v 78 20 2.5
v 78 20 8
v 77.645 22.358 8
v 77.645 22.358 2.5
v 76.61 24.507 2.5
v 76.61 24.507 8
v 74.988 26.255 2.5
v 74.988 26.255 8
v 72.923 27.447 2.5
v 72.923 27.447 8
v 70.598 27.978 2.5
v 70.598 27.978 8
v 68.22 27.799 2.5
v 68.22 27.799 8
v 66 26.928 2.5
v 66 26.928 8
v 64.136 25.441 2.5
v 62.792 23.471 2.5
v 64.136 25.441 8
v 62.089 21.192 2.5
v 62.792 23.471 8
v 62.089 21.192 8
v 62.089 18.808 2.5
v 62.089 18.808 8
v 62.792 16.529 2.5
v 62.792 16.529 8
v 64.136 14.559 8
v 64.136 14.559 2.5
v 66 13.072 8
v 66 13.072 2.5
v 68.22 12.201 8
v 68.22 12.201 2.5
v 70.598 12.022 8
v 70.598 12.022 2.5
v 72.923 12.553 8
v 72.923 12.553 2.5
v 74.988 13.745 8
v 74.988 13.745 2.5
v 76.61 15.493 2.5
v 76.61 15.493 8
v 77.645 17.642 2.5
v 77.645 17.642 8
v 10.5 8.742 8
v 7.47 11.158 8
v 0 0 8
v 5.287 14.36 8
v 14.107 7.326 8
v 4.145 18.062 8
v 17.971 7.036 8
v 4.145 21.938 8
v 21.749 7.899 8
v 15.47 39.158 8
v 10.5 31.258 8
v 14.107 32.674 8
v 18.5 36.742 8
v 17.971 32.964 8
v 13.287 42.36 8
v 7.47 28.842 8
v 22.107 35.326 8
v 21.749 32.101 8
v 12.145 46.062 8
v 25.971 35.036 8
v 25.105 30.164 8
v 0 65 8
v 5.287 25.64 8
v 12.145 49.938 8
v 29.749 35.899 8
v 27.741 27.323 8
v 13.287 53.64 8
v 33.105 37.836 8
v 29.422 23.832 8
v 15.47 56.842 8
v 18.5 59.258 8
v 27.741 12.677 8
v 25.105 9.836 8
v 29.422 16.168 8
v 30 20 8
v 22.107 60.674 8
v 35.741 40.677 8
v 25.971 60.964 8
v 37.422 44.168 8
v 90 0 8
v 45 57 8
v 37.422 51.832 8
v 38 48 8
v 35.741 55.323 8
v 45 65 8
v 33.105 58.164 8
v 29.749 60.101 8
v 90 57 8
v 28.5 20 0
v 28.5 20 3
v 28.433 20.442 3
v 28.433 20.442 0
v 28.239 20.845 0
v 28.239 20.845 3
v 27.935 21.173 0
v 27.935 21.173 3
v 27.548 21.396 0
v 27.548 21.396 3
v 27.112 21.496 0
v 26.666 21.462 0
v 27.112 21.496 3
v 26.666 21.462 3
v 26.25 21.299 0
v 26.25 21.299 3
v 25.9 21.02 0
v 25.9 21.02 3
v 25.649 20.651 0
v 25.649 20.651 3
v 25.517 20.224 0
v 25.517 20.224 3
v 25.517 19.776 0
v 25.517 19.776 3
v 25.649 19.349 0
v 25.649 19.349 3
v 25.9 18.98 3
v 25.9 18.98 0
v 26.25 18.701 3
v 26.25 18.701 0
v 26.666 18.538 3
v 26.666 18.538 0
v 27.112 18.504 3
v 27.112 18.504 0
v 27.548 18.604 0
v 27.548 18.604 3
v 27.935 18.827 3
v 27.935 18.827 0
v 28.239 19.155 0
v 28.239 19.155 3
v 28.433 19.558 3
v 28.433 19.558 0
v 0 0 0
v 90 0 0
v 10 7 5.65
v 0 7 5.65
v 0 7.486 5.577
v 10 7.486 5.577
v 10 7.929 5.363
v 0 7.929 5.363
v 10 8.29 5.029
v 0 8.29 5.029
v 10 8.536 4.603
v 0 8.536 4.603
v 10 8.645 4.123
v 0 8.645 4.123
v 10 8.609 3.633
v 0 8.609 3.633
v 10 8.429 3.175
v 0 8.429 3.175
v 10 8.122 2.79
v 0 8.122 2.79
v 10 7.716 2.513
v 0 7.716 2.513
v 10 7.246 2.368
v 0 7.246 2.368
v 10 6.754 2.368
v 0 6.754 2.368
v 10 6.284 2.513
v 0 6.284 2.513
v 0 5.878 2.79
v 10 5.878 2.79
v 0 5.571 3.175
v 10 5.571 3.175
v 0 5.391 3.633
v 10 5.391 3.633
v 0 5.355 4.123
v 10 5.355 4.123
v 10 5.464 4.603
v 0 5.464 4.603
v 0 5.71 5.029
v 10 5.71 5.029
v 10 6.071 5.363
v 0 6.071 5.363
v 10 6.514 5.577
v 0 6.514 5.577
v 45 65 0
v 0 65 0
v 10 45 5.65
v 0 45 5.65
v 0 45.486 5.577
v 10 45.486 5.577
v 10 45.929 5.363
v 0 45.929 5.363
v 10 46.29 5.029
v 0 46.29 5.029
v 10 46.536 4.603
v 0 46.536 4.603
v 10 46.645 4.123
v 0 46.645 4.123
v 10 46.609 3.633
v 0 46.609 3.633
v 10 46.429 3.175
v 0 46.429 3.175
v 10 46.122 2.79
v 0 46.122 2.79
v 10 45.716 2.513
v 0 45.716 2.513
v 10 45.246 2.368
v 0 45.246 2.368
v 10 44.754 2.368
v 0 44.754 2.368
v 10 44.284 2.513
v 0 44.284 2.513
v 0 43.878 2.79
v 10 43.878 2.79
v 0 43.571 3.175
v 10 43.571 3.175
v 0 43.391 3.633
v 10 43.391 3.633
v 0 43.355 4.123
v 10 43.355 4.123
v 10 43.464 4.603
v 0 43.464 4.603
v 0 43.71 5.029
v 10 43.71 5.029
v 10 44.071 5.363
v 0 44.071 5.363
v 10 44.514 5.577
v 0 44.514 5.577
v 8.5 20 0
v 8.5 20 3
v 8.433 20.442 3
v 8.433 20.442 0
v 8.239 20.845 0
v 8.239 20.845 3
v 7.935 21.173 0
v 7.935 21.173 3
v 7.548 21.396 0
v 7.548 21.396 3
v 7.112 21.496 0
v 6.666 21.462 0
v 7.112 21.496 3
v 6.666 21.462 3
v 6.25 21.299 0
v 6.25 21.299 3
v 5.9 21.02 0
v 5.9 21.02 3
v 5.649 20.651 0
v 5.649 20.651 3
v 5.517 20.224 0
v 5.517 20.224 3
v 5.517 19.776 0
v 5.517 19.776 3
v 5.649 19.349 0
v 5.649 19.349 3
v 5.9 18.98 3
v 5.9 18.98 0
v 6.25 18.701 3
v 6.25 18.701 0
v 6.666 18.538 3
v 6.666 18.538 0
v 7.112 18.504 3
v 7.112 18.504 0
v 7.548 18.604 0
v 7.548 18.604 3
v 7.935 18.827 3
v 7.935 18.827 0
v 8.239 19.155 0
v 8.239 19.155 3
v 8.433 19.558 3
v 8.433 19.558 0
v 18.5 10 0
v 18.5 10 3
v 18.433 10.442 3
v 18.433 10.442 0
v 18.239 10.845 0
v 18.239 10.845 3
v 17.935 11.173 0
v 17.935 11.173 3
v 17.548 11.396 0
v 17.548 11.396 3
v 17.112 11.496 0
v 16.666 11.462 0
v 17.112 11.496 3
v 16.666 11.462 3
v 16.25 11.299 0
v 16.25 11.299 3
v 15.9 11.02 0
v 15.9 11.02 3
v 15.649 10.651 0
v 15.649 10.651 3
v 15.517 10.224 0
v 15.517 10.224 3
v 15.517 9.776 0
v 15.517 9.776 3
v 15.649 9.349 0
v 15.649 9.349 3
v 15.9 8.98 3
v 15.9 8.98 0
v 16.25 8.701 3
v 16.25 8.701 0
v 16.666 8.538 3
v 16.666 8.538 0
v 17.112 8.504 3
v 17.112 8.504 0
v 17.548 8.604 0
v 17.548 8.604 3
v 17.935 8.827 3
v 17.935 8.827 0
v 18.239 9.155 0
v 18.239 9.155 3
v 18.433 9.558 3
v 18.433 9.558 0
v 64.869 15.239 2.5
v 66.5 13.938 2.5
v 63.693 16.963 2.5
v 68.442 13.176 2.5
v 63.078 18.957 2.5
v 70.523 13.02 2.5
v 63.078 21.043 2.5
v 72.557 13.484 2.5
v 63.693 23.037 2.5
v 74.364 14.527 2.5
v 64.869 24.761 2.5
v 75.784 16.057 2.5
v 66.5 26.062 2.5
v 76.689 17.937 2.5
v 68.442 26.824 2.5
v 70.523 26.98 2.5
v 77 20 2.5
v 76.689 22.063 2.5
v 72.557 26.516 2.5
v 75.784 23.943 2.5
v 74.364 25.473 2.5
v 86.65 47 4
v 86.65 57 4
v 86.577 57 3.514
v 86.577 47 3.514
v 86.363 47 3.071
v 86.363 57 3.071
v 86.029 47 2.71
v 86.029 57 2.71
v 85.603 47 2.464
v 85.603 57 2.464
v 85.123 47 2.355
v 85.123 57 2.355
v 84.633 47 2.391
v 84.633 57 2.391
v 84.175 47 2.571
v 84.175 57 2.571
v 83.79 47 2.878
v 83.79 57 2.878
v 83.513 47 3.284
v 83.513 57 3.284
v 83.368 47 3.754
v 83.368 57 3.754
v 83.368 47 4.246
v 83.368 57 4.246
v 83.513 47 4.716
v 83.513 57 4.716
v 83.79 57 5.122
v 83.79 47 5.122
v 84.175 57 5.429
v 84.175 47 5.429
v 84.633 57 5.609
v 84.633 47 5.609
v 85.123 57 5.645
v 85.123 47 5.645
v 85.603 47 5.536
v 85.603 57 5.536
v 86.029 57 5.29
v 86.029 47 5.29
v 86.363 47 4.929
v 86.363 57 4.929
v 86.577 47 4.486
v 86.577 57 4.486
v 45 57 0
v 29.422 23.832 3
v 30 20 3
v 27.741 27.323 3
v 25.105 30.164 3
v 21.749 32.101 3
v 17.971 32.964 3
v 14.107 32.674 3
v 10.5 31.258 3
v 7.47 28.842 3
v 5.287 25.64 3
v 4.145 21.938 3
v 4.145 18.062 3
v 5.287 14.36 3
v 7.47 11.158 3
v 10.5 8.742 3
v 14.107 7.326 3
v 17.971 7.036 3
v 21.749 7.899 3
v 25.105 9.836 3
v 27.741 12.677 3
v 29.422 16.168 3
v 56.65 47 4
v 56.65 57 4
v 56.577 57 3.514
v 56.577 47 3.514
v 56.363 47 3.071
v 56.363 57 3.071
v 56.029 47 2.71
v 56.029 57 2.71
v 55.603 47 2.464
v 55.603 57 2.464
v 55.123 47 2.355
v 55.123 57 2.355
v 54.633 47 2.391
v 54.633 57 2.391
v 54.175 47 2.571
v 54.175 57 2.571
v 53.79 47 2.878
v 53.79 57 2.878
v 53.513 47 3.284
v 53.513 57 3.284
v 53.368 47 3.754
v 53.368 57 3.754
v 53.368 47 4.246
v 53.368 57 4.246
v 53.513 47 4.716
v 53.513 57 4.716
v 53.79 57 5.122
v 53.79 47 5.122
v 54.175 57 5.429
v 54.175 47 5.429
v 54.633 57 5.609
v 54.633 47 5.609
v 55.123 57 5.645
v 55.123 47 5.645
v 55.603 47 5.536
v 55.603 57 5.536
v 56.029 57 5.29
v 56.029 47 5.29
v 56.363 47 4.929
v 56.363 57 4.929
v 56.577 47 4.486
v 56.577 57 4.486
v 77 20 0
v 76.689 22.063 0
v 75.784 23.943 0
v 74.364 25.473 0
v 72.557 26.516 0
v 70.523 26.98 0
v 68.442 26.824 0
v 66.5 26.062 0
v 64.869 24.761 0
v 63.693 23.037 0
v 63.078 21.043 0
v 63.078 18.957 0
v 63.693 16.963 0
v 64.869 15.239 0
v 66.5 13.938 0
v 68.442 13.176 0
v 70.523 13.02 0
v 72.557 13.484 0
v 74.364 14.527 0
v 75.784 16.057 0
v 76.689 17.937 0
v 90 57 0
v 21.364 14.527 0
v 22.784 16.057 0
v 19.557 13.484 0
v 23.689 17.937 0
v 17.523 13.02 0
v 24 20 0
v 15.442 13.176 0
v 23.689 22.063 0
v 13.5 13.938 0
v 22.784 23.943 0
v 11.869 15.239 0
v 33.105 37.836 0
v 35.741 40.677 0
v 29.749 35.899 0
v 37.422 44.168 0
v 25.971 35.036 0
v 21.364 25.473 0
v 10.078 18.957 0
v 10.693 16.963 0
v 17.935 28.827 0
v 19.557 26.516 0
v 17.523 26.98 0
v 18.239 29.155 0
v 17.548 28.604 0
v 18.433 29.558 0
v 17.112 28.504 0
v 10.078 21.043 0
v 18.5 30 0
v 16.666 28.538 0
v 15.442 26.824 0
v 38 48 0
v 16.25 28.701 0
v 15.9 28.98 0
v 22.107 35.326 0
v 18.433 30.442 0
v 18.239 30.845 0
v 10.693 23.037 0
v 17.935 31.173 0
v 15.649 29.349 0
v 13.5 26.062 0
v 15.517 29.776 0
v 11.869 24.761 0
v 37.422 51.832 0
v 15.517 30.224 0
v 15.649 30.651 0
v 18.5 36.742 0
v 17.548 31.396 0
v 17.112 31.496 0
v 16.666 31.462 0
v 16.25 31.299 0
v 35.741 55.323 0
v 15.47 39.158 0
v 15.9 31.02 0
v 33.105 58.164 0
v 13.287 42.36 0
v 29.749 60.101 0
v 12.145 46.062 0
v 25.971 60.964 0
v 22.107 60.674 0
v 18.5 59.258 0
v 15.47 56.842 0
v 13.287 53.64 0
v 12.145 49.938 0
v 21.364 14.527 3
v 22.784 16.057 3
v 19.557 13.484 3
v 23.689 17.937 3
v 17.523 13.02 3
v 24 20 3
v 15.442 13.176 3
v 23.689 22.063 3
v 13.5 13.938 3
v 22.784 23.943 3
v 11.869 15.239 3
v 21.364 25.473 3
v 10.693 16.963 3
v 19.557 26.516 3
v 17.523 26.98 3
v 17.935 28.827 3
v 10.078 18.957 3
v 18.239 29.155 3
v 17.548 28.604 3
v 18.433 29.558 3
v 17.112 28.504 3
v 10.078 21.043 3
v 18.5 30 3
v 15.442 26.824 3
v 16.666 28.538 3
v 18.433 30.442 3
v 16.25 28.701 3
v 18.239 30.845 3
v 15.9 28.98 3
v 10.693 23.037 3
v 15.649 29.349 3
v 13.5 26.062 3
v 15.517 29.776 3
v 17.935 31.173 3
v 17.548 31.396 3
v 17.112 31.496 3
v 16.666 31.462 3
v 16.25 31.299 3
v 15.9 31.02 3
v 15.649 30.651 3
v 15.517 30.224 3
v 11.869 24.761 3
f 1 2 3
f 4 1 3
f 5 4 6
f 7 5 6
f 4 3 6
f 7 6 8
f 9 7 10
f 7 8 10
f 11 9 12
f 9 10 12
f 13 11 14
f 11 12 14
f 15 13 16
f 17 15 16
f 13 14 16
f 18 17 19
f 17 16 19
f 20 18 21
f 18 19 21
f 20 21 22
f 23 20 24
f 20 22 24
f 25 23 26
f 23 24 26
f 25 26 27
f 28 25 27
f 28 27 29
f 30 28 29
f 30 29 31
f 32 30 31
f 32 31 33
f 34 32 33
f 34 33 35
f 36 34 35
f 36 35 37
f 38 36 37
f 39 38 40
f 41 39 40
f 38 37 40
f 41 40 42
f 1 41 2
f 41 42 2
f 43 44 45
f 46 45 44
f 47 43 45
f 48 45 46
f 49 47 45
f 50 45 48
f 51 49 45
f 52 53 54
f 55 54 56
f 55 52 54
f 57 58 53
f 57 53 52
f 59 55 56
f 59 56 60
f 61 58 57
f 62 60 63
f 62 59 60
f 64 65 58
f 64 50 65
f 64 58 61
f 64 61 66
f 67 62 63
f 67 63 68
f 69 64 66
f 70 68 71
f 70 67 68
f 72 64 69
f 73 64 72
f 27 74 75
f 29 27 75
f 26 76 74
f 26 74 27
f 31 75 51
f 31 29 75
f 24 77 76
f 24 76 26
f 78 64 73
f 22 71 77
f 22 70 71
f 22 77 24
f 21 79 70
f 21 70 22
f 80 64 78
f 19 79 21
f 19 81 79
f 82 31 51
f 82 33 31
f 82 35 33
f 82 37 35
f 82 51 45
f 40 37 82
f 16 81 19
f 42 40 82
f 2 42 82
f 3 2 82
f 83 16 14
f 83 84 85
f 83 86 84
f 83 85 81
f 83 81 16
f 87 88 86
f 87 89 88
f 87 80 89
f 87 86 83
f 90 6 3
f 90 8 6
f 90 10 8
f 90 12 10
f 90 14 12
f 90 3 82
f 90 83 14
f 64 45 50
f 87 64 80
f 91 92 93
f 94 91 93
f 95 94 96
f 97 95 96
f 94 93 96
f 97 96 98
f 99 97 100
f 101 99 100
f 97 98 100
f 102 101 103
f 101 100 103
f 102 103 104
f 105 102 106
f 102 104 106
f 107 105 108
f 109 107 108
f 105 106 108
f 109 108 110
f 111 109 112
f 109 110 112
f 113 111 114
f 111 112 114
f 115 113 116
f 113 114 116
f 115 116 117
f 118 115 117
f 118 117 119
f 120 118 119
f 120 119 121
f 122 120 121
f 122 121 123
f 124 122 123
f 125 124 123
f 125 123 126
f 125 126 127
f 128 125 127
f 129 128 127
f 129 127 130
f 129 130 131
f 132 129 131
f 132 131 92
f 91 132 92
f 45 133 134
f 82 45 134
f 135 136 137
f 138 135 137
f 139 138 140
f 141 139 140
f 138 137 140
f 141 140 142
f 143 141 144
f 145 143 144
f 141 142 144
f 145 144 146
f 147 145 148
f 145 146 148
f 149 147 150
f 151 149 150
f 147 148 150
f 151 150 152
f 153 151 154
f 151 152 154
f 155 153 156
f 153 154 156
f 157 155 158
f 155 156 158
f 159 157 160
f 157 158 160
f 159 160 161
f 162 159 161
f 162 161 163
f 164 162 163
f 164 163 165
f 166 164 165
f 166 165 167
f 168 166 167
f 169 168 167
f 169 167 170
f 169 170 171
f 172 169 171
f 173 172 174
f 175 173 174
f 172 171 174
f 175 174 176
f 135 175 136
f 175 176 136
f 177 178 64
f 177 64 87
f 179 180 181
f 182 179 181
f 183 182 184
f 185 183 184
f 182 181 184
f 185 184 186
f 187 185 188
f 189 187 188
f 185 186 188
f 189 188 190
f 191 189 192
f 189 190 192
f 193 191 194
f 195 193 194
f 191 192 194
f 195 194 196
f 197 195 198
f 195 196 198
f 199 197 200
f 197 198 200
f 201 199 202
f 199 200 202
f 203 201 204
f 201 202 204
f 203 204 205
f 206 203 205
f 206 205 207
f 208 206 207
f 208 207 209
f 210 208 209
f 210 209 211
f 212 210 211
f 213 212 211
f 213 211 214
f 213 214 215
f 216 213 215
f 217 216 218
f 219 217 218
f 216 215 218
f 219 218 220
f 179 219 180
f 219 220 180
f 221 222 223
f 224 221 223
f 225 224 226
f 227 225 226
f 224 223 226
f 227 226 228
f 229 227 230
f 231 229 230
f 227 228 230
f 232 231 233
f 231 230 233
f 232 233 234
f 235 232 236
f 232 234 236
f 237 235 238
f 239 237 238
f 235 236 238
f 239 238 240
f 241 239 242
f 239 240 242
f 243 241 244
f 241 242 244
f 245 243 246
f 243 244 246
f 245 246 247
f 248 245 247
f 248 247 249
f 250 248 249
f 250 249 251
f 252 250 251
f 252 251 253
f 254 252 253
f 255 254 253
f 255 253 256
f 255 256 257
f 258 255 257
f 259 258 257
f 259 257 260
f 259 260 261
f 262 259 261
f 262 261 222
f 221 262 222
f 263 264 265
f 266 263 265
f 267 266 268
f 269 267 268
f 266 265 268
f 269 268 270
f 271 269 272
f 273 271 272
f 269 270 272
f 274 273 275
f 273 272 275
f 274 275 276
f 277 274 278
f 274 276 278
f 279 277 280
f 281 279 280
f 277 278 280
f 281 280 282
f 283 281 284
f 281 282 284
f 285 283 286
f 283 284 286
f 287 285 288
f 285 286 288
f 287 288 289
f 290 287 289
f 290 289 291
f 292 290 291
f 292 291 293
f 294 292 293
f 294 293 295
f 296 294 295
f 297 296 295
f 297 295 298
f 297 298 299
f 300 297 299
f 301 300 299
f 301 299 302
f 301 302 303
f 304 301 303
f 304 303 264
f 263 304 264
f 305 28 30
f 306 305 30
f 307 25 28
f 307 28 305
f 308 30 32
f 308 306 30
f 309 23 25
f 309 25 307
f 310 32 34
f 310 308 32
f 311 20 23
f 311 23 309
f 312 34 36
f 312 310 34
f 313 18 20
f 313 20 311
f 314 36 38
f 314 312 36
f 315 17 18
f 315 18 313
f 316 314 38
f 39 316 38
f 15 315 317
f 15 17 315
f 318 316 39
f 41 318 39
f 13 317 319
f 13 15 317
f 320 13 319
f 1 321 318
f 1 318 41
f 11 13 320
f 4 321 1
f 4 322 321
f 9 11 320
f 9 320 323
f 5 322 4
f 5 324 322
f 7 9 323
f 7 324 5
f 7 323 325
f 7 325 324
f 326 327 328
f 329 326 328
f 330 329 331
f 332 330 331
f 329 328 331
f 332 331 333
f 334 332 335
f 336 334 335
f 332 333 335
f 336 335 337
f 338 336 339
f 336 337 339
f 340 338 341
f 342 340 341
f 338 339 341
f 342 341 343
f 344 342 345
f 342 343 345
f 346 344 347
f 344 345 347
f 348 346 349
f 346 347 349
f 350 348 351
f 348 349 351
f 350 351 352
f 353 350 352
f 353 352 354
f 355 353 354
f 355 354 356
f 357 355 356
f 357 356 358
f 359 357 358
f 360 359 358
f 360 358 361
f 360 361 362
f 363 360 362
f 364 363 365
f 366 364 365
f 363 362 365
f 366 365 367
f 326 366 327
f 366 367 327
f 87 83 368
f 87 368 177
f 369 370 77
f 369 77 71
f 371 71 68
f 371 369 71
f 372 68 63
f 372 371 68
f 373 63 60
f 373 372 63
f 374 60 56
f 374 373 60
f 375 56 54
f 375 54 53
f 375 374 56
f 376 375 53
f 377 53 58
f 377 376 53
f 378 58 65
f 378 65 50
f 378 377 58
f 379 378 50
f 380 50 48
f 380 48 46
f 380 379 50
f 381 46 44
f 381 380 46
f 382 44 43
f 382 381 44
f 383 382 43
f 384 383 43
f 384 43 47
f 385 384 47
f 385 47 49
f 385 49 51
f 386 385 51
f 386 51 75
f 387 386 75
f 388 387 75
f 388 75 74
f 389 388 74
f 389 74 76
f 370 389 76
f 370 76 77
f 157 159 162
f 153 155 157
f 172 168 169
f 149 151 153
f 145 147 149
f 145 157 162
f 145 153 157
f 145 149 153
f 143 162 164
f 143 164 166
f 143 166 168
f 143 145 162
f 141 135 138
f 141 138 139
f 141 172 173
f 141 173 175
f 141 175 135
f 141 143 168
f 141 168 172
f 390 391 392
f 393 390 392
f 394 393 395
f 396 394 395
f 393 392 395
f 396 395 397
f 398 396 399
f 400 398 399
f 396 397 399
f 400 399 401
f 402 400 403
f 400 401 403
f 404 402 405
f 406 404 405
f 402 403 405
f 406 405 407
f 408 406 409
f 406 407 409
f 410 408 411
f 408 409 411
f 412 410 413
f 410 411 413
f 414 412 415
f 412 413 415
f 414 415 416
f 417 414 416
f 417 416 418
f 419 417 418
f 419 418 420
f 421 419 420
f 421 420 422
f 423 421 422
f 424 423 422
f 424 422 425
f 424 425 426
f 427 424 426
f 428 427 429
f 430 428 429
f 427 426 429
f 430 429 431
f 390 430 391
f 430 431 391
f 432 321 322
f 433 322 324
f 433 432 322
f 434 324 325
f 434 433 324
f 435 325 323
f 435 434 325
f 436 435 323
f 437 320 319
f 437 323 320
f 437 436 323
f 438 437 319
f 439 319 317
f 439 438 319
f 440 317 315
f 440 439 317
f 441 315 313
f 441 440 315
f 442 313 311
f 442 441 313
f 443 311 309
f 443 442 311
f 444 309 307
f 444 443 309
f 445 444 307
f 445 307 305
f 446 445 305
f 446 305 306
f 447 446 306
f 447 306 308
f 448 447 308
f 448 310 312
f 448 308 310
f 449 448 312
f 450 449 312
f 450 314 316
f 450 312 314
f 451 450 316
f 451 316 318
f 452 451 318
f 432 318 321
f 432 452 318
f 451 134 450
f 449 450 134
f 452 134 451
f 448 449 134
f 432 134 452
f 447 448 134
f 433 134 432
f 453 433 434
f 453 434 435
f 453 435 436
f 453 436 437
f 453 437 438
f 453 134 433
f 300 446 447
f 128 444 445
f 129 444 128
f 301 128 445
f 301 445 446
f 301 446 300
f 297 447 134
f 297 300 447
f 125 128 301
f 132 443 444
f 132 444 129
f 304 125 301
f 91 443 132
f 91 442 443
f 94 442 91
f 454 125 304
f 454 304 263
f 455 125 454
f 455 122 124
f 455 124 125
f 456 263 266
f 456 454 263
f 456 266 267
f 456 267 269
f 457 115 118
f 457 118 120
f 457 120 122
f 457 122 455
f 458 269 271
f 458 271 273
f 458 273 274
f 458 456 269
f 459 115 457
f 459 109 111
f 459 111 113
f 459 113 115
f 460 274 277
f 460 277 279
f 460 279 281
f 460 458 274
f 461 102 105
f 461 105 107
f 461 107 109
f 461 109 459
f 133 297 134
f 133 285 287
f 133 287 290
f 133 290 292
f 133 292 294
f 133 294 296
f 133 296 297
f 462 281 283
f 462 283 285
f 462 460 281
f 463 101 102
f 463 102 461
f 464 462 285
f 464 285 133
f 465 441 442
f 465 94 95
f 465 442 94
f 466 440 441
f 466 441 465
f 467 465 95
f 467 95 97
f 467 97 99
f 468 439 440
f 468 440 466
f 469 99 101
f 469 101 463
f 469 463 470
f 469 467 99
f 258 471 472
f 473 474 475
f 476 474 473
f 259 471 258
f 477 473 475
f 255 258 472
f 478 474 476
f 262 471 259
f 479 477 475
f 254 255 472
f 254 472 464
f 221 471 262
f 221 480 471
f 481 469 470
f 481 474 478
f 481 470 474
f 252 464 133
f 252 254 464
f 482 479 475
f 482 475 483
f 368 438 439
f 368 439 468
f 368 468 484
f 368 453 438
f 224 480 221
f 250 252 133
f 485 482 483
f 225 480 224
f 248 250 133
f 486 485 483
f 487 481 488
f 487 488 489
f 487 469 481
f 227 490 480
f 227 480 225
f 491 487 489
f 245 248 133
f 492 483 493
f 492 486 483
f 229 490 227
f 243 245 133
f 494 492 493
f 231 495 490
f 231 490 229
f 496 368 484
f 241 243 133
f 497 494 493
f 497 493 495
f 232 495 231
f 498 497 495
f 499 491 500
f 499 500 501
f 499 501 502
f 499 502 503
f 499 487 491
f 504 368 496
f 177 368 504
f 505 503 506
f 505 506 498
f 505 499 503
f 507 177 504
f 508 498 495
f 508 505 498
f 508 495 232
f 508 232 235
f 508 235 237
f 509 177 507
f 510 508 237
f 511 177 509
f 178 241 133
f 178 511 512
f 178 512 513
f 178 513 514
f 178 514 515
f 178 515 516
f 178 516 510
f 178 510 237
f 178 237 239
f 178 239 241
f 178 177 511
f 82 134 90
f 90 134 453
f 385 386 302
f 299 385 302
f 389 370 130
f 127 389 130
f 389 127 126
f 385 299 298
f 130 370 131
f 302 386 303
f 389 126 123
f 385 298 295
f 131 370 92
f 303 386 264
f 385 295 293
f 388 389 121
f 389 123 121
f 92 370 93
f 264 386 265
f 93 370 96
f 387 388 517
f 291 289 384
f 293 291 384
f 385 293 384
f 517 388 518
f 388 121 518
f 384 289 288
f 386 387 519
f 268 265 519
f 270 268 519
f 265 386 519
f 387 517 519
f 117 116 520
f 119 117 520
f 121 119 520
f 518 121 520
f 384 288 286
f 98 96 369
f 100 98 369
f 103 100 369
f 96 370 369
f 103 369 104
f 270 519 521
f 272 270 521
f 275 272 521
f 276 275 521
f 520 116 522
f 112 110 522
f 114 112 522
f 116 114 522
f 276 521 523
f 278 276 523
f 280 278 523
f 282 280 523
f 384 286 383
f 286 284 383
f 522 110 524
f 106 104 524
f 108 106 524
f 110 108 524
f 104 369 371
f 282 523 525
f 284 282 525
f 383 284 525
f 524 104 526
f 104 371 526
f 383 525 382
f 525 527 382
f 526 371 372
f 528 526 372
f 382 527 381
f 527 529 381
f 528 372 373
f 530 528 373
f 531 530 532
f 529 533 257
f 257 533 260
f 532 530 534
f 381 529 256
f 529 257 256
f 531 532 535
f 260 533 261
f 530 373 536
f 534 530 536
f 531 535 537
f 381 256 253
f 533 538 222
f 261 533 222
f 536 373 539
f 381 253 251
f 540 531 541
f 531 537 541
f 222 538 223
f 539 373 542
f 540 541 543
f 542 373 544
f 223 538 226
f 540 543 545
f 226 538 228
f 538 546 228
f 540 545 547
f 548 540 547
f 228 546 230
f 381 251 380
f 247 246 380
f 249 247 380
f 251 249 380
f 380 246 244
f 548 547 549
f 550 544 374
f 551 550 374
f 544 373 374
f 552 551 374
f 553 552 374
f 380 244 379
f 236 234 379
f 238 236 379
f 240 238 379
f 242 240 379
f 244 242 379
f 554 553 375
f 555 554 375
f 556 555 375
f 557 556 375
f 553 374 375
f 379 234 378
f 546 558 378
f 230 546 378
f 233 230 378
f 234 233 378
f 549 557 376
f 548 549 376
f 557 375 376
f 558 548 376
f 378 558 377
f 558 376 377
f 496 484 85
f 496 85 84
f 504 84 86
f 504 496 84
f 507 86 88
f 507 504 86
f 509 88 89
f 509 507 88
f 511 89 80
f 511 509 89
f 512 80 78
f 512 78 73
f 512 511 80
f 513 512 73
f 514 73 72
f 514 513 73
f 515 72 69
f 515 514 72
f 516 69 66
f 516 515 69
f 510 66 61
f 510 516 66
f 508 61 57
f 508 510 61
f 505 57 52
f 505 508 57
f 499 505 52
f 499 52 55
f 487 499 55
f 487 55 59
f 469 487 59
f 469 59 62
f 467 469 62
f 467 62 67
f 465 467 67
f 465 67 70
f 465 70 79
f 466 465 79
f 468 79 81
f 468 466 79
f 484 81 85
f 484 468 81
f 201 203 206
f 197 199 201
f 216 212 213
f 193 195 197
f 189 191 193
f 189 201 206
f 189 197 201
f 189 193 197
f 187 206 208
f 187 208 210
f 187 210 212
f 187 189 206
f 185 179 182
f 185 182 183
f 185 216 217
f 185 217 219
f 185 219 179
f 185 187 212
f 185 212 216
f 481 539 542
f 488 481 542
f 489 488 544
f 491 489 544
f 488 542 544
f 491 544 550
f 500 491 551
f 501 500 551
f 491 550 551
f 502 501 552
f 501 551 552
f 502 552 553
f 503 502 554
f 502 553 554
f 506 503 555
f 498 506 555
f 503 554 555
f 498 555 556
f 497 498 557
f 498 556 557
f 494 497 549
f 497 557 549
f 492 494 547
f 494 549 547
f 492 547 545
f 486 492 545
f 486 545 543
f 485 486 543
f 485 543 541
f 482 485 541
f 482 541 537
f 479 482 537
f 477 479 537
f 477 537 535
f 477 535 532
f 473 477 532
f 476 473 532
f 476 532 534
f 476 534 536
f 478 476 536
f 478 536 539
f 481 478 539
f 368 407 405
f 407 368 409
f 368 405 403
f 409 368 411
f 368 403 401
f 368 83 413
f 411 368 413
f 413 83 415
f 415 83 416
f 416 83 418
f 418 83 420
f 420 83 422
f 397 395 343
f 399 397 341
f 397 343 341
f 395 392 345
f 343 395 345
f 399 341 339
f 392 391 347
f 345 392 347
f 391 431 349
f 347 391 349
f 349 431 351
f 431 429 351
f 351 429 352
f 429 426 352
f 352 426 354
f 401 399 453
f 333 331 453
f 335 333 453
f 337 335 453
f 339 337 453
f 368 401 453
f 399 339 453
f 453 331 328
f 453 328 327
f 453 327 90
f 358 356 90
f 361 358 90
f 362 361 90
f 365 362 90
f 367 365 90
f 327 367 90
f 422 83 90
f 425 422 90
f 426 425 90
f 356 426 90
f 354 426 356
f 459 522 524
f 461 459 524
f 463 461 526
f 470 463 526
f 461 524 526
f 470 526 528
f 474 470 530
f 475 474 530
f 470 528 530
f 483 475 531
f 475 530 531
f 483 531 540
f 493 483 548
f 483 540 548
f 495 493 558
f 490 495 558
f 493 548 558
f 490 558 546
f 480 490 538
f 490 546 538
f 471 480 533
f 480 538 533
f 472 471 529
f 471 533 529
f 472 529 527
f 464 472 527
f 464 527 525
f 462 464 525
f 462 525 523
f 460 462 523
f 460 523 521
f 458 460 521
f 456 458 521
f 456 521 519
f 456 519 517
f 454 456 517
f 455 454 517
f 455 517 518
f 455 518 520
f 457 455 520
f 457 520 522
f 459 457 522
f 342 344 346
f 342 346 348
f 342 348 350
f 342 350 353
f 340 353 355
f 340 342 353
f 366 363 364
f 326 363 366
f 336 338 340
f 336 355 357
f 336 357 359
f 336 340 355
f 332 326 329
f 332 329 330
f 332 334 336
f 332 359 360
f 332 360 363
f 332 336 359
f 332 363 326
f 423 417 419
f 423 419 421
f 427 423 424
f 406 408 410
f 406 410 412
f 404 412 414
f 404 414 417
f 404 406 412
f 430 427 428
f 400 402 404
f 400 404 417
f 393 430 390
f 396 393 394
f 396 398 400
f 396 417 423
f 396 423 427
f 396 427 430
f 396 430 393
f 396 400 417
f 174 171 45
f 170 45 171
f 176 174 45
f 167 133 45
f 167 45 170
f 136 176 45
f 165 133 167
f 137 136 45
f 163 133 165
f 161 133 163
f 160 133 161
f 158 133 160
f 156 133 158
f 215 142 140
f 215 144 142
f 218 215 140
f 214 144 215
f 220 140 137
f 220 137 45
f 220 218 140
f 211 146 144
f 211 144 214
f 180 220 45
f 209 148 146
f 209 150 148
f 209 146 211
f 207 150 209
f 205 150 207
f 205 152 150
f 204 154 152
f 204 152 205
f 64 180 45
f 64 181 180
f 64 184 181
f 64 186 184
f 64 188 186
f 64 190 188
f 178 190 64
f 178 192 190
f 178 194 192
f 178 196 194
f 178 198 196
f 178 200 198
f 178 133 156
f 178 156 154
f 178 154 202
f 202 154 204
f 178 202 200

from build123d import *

# Parameters (mm, degrees)
ESQUISSE1_W             = 90
ESQUISSE1_H             = 65
ESQUISSE1_R             = 7
ESQUISSE1_R_2           = 13
BOSS_EXTRU_1_DEPTH      = 8
ESQUISSE2_R             = 13
BOSS_EXTRU_2_DEPTH      = 3
ESQUISSE3_R             = 7
ESQUISSE3_R_2           = 1.5
ENL_V_MAT_EXTRU_1_DEPTH = 4
ESQUISSE4_R             = 8
ENL_V_MAT_EXTRU_2_DEPTH = 5.5
ESQUISSE5_W             = 45
ESQUISSE5_H             = 8
ENL_V_MAT_EXTRU_3_DEPTH = 9
ESQUISSE6_R             = 1.65
ENL_V_MAT_EXTRU_4_DEPTH = 10
ESQUISSE7_R             = 1.65
ENL_V_MAT_EXTRU_5_DEPTH = 10


with BuildPart() as part:
    # Esquisse1 → Boss.-Extru.1 (new body)
    with BuildSketch(Plane.XY):
        with Locations((45, 32.5)):
            Rectangle(ESQUISSE1_W, ESQUISSE1_H)
        with Locations((70, 20)):
            Circle(ESQUISSE1_R, mode=Mode.SUBTRACT)
        with Locations((17, 20)):
            Circle(ESQUISSE1_R_2, mode=Mode.SUBTRACT)
        with Locations((25, 48)):
            Circle(ESQUISSE1_R_2, mode=Mode.SUBTRACT)
    extrude(amount=BOSS_EXTRU_1_DEPTH)

    # Esquisse2 → Boss.-Extru.2 (add)
    with BuildSketch(Plane(origin=(0, 0, 0), x_dir=(-1, 0, 0), z_dir=(0, 0, -1))):
        with Locations((-17, 20)):
            Circle(ESQUISSE2_R)
    extrude(amount=-BOSS_EXTRU_2_DEPTH)

    # Esquisse3 → Enlèv. mat.-Extru.1 (cut, through all)
    with BuildSketch(Plane.XY.offset(3)):
        with Locations((17, 20)):
            Circle(ESQUISSE3_R)
        with Locations((27, 20)):
            Circle(ESQUISSE3_R_2)
        with Locations((17, 10)):
            Circle(ESQUISSE3_R_2)
        with Locations((7, 20)):
            Circle(ESQUISSE3_R_2)
        with Locations((17, 30)):
            Circle(ESQUISSE3_R_2)
    extrude(amount=-ENL_V_MAT_EXTRU_1_DEPTH, mode=Mode.SUBTRACT)

    # Esquisse4 → Enlèv. mat.-Extru.2 (cut)
    with BuildSketch(Plane.XY.offset(8)):
        with Locations((70, 20)):
            Circle(ESQUISSE4_R)
    extrude(amount=-ENL_V_MAT_EXTRU_2_DEPTH, mode=Mode.SUBTRACT)

    # Esquisse5 → Enlèv. mat.-Extru.3 (cut, through all)
    with BuildSketch(Plane.XY.offset(8)):
        with Locations((67.5, 61)):
            Rectangle(ESQUISSE5_W, ESQUISSE5_H)
    extrude(amount=-ENL_V_MAT_EXTRU_3_DEPTH, mode=Mode.SUBTRACT)

    # Esquisse6 → Enlèv. mat.-Extru.4 (cut)
    with BuildSketch(Plane.ZY):
        with Locations((4, 7)):
            Circle(ESQUISSE6_R)
        with Locations((4, 45)):
            Circle(ESQUISSE6_R)
    extrude(amount=-ENL_V_MAT_EXTRU_4_DEPTH, mode=Mode.SUBTRACT)

    # Esquisse7 → Enlèv. mat.-Extru.5 (cut)
    with BuildSketch(Plane(origin=(0, 57, 0), x_dir=(1, 0, 0), z_dir=(0, 1, 0))):
        with Locations((85, -4)):
            Circle(ESQUISSE7_R)
        with Locations((55, -4)):
            Circle(ESQUISSE7_R)
    extrude(amount=-ENL_V_MAT_EXTRU_5_DEPTH, mode=Mode.SUBTRACT)


solid = part.part
